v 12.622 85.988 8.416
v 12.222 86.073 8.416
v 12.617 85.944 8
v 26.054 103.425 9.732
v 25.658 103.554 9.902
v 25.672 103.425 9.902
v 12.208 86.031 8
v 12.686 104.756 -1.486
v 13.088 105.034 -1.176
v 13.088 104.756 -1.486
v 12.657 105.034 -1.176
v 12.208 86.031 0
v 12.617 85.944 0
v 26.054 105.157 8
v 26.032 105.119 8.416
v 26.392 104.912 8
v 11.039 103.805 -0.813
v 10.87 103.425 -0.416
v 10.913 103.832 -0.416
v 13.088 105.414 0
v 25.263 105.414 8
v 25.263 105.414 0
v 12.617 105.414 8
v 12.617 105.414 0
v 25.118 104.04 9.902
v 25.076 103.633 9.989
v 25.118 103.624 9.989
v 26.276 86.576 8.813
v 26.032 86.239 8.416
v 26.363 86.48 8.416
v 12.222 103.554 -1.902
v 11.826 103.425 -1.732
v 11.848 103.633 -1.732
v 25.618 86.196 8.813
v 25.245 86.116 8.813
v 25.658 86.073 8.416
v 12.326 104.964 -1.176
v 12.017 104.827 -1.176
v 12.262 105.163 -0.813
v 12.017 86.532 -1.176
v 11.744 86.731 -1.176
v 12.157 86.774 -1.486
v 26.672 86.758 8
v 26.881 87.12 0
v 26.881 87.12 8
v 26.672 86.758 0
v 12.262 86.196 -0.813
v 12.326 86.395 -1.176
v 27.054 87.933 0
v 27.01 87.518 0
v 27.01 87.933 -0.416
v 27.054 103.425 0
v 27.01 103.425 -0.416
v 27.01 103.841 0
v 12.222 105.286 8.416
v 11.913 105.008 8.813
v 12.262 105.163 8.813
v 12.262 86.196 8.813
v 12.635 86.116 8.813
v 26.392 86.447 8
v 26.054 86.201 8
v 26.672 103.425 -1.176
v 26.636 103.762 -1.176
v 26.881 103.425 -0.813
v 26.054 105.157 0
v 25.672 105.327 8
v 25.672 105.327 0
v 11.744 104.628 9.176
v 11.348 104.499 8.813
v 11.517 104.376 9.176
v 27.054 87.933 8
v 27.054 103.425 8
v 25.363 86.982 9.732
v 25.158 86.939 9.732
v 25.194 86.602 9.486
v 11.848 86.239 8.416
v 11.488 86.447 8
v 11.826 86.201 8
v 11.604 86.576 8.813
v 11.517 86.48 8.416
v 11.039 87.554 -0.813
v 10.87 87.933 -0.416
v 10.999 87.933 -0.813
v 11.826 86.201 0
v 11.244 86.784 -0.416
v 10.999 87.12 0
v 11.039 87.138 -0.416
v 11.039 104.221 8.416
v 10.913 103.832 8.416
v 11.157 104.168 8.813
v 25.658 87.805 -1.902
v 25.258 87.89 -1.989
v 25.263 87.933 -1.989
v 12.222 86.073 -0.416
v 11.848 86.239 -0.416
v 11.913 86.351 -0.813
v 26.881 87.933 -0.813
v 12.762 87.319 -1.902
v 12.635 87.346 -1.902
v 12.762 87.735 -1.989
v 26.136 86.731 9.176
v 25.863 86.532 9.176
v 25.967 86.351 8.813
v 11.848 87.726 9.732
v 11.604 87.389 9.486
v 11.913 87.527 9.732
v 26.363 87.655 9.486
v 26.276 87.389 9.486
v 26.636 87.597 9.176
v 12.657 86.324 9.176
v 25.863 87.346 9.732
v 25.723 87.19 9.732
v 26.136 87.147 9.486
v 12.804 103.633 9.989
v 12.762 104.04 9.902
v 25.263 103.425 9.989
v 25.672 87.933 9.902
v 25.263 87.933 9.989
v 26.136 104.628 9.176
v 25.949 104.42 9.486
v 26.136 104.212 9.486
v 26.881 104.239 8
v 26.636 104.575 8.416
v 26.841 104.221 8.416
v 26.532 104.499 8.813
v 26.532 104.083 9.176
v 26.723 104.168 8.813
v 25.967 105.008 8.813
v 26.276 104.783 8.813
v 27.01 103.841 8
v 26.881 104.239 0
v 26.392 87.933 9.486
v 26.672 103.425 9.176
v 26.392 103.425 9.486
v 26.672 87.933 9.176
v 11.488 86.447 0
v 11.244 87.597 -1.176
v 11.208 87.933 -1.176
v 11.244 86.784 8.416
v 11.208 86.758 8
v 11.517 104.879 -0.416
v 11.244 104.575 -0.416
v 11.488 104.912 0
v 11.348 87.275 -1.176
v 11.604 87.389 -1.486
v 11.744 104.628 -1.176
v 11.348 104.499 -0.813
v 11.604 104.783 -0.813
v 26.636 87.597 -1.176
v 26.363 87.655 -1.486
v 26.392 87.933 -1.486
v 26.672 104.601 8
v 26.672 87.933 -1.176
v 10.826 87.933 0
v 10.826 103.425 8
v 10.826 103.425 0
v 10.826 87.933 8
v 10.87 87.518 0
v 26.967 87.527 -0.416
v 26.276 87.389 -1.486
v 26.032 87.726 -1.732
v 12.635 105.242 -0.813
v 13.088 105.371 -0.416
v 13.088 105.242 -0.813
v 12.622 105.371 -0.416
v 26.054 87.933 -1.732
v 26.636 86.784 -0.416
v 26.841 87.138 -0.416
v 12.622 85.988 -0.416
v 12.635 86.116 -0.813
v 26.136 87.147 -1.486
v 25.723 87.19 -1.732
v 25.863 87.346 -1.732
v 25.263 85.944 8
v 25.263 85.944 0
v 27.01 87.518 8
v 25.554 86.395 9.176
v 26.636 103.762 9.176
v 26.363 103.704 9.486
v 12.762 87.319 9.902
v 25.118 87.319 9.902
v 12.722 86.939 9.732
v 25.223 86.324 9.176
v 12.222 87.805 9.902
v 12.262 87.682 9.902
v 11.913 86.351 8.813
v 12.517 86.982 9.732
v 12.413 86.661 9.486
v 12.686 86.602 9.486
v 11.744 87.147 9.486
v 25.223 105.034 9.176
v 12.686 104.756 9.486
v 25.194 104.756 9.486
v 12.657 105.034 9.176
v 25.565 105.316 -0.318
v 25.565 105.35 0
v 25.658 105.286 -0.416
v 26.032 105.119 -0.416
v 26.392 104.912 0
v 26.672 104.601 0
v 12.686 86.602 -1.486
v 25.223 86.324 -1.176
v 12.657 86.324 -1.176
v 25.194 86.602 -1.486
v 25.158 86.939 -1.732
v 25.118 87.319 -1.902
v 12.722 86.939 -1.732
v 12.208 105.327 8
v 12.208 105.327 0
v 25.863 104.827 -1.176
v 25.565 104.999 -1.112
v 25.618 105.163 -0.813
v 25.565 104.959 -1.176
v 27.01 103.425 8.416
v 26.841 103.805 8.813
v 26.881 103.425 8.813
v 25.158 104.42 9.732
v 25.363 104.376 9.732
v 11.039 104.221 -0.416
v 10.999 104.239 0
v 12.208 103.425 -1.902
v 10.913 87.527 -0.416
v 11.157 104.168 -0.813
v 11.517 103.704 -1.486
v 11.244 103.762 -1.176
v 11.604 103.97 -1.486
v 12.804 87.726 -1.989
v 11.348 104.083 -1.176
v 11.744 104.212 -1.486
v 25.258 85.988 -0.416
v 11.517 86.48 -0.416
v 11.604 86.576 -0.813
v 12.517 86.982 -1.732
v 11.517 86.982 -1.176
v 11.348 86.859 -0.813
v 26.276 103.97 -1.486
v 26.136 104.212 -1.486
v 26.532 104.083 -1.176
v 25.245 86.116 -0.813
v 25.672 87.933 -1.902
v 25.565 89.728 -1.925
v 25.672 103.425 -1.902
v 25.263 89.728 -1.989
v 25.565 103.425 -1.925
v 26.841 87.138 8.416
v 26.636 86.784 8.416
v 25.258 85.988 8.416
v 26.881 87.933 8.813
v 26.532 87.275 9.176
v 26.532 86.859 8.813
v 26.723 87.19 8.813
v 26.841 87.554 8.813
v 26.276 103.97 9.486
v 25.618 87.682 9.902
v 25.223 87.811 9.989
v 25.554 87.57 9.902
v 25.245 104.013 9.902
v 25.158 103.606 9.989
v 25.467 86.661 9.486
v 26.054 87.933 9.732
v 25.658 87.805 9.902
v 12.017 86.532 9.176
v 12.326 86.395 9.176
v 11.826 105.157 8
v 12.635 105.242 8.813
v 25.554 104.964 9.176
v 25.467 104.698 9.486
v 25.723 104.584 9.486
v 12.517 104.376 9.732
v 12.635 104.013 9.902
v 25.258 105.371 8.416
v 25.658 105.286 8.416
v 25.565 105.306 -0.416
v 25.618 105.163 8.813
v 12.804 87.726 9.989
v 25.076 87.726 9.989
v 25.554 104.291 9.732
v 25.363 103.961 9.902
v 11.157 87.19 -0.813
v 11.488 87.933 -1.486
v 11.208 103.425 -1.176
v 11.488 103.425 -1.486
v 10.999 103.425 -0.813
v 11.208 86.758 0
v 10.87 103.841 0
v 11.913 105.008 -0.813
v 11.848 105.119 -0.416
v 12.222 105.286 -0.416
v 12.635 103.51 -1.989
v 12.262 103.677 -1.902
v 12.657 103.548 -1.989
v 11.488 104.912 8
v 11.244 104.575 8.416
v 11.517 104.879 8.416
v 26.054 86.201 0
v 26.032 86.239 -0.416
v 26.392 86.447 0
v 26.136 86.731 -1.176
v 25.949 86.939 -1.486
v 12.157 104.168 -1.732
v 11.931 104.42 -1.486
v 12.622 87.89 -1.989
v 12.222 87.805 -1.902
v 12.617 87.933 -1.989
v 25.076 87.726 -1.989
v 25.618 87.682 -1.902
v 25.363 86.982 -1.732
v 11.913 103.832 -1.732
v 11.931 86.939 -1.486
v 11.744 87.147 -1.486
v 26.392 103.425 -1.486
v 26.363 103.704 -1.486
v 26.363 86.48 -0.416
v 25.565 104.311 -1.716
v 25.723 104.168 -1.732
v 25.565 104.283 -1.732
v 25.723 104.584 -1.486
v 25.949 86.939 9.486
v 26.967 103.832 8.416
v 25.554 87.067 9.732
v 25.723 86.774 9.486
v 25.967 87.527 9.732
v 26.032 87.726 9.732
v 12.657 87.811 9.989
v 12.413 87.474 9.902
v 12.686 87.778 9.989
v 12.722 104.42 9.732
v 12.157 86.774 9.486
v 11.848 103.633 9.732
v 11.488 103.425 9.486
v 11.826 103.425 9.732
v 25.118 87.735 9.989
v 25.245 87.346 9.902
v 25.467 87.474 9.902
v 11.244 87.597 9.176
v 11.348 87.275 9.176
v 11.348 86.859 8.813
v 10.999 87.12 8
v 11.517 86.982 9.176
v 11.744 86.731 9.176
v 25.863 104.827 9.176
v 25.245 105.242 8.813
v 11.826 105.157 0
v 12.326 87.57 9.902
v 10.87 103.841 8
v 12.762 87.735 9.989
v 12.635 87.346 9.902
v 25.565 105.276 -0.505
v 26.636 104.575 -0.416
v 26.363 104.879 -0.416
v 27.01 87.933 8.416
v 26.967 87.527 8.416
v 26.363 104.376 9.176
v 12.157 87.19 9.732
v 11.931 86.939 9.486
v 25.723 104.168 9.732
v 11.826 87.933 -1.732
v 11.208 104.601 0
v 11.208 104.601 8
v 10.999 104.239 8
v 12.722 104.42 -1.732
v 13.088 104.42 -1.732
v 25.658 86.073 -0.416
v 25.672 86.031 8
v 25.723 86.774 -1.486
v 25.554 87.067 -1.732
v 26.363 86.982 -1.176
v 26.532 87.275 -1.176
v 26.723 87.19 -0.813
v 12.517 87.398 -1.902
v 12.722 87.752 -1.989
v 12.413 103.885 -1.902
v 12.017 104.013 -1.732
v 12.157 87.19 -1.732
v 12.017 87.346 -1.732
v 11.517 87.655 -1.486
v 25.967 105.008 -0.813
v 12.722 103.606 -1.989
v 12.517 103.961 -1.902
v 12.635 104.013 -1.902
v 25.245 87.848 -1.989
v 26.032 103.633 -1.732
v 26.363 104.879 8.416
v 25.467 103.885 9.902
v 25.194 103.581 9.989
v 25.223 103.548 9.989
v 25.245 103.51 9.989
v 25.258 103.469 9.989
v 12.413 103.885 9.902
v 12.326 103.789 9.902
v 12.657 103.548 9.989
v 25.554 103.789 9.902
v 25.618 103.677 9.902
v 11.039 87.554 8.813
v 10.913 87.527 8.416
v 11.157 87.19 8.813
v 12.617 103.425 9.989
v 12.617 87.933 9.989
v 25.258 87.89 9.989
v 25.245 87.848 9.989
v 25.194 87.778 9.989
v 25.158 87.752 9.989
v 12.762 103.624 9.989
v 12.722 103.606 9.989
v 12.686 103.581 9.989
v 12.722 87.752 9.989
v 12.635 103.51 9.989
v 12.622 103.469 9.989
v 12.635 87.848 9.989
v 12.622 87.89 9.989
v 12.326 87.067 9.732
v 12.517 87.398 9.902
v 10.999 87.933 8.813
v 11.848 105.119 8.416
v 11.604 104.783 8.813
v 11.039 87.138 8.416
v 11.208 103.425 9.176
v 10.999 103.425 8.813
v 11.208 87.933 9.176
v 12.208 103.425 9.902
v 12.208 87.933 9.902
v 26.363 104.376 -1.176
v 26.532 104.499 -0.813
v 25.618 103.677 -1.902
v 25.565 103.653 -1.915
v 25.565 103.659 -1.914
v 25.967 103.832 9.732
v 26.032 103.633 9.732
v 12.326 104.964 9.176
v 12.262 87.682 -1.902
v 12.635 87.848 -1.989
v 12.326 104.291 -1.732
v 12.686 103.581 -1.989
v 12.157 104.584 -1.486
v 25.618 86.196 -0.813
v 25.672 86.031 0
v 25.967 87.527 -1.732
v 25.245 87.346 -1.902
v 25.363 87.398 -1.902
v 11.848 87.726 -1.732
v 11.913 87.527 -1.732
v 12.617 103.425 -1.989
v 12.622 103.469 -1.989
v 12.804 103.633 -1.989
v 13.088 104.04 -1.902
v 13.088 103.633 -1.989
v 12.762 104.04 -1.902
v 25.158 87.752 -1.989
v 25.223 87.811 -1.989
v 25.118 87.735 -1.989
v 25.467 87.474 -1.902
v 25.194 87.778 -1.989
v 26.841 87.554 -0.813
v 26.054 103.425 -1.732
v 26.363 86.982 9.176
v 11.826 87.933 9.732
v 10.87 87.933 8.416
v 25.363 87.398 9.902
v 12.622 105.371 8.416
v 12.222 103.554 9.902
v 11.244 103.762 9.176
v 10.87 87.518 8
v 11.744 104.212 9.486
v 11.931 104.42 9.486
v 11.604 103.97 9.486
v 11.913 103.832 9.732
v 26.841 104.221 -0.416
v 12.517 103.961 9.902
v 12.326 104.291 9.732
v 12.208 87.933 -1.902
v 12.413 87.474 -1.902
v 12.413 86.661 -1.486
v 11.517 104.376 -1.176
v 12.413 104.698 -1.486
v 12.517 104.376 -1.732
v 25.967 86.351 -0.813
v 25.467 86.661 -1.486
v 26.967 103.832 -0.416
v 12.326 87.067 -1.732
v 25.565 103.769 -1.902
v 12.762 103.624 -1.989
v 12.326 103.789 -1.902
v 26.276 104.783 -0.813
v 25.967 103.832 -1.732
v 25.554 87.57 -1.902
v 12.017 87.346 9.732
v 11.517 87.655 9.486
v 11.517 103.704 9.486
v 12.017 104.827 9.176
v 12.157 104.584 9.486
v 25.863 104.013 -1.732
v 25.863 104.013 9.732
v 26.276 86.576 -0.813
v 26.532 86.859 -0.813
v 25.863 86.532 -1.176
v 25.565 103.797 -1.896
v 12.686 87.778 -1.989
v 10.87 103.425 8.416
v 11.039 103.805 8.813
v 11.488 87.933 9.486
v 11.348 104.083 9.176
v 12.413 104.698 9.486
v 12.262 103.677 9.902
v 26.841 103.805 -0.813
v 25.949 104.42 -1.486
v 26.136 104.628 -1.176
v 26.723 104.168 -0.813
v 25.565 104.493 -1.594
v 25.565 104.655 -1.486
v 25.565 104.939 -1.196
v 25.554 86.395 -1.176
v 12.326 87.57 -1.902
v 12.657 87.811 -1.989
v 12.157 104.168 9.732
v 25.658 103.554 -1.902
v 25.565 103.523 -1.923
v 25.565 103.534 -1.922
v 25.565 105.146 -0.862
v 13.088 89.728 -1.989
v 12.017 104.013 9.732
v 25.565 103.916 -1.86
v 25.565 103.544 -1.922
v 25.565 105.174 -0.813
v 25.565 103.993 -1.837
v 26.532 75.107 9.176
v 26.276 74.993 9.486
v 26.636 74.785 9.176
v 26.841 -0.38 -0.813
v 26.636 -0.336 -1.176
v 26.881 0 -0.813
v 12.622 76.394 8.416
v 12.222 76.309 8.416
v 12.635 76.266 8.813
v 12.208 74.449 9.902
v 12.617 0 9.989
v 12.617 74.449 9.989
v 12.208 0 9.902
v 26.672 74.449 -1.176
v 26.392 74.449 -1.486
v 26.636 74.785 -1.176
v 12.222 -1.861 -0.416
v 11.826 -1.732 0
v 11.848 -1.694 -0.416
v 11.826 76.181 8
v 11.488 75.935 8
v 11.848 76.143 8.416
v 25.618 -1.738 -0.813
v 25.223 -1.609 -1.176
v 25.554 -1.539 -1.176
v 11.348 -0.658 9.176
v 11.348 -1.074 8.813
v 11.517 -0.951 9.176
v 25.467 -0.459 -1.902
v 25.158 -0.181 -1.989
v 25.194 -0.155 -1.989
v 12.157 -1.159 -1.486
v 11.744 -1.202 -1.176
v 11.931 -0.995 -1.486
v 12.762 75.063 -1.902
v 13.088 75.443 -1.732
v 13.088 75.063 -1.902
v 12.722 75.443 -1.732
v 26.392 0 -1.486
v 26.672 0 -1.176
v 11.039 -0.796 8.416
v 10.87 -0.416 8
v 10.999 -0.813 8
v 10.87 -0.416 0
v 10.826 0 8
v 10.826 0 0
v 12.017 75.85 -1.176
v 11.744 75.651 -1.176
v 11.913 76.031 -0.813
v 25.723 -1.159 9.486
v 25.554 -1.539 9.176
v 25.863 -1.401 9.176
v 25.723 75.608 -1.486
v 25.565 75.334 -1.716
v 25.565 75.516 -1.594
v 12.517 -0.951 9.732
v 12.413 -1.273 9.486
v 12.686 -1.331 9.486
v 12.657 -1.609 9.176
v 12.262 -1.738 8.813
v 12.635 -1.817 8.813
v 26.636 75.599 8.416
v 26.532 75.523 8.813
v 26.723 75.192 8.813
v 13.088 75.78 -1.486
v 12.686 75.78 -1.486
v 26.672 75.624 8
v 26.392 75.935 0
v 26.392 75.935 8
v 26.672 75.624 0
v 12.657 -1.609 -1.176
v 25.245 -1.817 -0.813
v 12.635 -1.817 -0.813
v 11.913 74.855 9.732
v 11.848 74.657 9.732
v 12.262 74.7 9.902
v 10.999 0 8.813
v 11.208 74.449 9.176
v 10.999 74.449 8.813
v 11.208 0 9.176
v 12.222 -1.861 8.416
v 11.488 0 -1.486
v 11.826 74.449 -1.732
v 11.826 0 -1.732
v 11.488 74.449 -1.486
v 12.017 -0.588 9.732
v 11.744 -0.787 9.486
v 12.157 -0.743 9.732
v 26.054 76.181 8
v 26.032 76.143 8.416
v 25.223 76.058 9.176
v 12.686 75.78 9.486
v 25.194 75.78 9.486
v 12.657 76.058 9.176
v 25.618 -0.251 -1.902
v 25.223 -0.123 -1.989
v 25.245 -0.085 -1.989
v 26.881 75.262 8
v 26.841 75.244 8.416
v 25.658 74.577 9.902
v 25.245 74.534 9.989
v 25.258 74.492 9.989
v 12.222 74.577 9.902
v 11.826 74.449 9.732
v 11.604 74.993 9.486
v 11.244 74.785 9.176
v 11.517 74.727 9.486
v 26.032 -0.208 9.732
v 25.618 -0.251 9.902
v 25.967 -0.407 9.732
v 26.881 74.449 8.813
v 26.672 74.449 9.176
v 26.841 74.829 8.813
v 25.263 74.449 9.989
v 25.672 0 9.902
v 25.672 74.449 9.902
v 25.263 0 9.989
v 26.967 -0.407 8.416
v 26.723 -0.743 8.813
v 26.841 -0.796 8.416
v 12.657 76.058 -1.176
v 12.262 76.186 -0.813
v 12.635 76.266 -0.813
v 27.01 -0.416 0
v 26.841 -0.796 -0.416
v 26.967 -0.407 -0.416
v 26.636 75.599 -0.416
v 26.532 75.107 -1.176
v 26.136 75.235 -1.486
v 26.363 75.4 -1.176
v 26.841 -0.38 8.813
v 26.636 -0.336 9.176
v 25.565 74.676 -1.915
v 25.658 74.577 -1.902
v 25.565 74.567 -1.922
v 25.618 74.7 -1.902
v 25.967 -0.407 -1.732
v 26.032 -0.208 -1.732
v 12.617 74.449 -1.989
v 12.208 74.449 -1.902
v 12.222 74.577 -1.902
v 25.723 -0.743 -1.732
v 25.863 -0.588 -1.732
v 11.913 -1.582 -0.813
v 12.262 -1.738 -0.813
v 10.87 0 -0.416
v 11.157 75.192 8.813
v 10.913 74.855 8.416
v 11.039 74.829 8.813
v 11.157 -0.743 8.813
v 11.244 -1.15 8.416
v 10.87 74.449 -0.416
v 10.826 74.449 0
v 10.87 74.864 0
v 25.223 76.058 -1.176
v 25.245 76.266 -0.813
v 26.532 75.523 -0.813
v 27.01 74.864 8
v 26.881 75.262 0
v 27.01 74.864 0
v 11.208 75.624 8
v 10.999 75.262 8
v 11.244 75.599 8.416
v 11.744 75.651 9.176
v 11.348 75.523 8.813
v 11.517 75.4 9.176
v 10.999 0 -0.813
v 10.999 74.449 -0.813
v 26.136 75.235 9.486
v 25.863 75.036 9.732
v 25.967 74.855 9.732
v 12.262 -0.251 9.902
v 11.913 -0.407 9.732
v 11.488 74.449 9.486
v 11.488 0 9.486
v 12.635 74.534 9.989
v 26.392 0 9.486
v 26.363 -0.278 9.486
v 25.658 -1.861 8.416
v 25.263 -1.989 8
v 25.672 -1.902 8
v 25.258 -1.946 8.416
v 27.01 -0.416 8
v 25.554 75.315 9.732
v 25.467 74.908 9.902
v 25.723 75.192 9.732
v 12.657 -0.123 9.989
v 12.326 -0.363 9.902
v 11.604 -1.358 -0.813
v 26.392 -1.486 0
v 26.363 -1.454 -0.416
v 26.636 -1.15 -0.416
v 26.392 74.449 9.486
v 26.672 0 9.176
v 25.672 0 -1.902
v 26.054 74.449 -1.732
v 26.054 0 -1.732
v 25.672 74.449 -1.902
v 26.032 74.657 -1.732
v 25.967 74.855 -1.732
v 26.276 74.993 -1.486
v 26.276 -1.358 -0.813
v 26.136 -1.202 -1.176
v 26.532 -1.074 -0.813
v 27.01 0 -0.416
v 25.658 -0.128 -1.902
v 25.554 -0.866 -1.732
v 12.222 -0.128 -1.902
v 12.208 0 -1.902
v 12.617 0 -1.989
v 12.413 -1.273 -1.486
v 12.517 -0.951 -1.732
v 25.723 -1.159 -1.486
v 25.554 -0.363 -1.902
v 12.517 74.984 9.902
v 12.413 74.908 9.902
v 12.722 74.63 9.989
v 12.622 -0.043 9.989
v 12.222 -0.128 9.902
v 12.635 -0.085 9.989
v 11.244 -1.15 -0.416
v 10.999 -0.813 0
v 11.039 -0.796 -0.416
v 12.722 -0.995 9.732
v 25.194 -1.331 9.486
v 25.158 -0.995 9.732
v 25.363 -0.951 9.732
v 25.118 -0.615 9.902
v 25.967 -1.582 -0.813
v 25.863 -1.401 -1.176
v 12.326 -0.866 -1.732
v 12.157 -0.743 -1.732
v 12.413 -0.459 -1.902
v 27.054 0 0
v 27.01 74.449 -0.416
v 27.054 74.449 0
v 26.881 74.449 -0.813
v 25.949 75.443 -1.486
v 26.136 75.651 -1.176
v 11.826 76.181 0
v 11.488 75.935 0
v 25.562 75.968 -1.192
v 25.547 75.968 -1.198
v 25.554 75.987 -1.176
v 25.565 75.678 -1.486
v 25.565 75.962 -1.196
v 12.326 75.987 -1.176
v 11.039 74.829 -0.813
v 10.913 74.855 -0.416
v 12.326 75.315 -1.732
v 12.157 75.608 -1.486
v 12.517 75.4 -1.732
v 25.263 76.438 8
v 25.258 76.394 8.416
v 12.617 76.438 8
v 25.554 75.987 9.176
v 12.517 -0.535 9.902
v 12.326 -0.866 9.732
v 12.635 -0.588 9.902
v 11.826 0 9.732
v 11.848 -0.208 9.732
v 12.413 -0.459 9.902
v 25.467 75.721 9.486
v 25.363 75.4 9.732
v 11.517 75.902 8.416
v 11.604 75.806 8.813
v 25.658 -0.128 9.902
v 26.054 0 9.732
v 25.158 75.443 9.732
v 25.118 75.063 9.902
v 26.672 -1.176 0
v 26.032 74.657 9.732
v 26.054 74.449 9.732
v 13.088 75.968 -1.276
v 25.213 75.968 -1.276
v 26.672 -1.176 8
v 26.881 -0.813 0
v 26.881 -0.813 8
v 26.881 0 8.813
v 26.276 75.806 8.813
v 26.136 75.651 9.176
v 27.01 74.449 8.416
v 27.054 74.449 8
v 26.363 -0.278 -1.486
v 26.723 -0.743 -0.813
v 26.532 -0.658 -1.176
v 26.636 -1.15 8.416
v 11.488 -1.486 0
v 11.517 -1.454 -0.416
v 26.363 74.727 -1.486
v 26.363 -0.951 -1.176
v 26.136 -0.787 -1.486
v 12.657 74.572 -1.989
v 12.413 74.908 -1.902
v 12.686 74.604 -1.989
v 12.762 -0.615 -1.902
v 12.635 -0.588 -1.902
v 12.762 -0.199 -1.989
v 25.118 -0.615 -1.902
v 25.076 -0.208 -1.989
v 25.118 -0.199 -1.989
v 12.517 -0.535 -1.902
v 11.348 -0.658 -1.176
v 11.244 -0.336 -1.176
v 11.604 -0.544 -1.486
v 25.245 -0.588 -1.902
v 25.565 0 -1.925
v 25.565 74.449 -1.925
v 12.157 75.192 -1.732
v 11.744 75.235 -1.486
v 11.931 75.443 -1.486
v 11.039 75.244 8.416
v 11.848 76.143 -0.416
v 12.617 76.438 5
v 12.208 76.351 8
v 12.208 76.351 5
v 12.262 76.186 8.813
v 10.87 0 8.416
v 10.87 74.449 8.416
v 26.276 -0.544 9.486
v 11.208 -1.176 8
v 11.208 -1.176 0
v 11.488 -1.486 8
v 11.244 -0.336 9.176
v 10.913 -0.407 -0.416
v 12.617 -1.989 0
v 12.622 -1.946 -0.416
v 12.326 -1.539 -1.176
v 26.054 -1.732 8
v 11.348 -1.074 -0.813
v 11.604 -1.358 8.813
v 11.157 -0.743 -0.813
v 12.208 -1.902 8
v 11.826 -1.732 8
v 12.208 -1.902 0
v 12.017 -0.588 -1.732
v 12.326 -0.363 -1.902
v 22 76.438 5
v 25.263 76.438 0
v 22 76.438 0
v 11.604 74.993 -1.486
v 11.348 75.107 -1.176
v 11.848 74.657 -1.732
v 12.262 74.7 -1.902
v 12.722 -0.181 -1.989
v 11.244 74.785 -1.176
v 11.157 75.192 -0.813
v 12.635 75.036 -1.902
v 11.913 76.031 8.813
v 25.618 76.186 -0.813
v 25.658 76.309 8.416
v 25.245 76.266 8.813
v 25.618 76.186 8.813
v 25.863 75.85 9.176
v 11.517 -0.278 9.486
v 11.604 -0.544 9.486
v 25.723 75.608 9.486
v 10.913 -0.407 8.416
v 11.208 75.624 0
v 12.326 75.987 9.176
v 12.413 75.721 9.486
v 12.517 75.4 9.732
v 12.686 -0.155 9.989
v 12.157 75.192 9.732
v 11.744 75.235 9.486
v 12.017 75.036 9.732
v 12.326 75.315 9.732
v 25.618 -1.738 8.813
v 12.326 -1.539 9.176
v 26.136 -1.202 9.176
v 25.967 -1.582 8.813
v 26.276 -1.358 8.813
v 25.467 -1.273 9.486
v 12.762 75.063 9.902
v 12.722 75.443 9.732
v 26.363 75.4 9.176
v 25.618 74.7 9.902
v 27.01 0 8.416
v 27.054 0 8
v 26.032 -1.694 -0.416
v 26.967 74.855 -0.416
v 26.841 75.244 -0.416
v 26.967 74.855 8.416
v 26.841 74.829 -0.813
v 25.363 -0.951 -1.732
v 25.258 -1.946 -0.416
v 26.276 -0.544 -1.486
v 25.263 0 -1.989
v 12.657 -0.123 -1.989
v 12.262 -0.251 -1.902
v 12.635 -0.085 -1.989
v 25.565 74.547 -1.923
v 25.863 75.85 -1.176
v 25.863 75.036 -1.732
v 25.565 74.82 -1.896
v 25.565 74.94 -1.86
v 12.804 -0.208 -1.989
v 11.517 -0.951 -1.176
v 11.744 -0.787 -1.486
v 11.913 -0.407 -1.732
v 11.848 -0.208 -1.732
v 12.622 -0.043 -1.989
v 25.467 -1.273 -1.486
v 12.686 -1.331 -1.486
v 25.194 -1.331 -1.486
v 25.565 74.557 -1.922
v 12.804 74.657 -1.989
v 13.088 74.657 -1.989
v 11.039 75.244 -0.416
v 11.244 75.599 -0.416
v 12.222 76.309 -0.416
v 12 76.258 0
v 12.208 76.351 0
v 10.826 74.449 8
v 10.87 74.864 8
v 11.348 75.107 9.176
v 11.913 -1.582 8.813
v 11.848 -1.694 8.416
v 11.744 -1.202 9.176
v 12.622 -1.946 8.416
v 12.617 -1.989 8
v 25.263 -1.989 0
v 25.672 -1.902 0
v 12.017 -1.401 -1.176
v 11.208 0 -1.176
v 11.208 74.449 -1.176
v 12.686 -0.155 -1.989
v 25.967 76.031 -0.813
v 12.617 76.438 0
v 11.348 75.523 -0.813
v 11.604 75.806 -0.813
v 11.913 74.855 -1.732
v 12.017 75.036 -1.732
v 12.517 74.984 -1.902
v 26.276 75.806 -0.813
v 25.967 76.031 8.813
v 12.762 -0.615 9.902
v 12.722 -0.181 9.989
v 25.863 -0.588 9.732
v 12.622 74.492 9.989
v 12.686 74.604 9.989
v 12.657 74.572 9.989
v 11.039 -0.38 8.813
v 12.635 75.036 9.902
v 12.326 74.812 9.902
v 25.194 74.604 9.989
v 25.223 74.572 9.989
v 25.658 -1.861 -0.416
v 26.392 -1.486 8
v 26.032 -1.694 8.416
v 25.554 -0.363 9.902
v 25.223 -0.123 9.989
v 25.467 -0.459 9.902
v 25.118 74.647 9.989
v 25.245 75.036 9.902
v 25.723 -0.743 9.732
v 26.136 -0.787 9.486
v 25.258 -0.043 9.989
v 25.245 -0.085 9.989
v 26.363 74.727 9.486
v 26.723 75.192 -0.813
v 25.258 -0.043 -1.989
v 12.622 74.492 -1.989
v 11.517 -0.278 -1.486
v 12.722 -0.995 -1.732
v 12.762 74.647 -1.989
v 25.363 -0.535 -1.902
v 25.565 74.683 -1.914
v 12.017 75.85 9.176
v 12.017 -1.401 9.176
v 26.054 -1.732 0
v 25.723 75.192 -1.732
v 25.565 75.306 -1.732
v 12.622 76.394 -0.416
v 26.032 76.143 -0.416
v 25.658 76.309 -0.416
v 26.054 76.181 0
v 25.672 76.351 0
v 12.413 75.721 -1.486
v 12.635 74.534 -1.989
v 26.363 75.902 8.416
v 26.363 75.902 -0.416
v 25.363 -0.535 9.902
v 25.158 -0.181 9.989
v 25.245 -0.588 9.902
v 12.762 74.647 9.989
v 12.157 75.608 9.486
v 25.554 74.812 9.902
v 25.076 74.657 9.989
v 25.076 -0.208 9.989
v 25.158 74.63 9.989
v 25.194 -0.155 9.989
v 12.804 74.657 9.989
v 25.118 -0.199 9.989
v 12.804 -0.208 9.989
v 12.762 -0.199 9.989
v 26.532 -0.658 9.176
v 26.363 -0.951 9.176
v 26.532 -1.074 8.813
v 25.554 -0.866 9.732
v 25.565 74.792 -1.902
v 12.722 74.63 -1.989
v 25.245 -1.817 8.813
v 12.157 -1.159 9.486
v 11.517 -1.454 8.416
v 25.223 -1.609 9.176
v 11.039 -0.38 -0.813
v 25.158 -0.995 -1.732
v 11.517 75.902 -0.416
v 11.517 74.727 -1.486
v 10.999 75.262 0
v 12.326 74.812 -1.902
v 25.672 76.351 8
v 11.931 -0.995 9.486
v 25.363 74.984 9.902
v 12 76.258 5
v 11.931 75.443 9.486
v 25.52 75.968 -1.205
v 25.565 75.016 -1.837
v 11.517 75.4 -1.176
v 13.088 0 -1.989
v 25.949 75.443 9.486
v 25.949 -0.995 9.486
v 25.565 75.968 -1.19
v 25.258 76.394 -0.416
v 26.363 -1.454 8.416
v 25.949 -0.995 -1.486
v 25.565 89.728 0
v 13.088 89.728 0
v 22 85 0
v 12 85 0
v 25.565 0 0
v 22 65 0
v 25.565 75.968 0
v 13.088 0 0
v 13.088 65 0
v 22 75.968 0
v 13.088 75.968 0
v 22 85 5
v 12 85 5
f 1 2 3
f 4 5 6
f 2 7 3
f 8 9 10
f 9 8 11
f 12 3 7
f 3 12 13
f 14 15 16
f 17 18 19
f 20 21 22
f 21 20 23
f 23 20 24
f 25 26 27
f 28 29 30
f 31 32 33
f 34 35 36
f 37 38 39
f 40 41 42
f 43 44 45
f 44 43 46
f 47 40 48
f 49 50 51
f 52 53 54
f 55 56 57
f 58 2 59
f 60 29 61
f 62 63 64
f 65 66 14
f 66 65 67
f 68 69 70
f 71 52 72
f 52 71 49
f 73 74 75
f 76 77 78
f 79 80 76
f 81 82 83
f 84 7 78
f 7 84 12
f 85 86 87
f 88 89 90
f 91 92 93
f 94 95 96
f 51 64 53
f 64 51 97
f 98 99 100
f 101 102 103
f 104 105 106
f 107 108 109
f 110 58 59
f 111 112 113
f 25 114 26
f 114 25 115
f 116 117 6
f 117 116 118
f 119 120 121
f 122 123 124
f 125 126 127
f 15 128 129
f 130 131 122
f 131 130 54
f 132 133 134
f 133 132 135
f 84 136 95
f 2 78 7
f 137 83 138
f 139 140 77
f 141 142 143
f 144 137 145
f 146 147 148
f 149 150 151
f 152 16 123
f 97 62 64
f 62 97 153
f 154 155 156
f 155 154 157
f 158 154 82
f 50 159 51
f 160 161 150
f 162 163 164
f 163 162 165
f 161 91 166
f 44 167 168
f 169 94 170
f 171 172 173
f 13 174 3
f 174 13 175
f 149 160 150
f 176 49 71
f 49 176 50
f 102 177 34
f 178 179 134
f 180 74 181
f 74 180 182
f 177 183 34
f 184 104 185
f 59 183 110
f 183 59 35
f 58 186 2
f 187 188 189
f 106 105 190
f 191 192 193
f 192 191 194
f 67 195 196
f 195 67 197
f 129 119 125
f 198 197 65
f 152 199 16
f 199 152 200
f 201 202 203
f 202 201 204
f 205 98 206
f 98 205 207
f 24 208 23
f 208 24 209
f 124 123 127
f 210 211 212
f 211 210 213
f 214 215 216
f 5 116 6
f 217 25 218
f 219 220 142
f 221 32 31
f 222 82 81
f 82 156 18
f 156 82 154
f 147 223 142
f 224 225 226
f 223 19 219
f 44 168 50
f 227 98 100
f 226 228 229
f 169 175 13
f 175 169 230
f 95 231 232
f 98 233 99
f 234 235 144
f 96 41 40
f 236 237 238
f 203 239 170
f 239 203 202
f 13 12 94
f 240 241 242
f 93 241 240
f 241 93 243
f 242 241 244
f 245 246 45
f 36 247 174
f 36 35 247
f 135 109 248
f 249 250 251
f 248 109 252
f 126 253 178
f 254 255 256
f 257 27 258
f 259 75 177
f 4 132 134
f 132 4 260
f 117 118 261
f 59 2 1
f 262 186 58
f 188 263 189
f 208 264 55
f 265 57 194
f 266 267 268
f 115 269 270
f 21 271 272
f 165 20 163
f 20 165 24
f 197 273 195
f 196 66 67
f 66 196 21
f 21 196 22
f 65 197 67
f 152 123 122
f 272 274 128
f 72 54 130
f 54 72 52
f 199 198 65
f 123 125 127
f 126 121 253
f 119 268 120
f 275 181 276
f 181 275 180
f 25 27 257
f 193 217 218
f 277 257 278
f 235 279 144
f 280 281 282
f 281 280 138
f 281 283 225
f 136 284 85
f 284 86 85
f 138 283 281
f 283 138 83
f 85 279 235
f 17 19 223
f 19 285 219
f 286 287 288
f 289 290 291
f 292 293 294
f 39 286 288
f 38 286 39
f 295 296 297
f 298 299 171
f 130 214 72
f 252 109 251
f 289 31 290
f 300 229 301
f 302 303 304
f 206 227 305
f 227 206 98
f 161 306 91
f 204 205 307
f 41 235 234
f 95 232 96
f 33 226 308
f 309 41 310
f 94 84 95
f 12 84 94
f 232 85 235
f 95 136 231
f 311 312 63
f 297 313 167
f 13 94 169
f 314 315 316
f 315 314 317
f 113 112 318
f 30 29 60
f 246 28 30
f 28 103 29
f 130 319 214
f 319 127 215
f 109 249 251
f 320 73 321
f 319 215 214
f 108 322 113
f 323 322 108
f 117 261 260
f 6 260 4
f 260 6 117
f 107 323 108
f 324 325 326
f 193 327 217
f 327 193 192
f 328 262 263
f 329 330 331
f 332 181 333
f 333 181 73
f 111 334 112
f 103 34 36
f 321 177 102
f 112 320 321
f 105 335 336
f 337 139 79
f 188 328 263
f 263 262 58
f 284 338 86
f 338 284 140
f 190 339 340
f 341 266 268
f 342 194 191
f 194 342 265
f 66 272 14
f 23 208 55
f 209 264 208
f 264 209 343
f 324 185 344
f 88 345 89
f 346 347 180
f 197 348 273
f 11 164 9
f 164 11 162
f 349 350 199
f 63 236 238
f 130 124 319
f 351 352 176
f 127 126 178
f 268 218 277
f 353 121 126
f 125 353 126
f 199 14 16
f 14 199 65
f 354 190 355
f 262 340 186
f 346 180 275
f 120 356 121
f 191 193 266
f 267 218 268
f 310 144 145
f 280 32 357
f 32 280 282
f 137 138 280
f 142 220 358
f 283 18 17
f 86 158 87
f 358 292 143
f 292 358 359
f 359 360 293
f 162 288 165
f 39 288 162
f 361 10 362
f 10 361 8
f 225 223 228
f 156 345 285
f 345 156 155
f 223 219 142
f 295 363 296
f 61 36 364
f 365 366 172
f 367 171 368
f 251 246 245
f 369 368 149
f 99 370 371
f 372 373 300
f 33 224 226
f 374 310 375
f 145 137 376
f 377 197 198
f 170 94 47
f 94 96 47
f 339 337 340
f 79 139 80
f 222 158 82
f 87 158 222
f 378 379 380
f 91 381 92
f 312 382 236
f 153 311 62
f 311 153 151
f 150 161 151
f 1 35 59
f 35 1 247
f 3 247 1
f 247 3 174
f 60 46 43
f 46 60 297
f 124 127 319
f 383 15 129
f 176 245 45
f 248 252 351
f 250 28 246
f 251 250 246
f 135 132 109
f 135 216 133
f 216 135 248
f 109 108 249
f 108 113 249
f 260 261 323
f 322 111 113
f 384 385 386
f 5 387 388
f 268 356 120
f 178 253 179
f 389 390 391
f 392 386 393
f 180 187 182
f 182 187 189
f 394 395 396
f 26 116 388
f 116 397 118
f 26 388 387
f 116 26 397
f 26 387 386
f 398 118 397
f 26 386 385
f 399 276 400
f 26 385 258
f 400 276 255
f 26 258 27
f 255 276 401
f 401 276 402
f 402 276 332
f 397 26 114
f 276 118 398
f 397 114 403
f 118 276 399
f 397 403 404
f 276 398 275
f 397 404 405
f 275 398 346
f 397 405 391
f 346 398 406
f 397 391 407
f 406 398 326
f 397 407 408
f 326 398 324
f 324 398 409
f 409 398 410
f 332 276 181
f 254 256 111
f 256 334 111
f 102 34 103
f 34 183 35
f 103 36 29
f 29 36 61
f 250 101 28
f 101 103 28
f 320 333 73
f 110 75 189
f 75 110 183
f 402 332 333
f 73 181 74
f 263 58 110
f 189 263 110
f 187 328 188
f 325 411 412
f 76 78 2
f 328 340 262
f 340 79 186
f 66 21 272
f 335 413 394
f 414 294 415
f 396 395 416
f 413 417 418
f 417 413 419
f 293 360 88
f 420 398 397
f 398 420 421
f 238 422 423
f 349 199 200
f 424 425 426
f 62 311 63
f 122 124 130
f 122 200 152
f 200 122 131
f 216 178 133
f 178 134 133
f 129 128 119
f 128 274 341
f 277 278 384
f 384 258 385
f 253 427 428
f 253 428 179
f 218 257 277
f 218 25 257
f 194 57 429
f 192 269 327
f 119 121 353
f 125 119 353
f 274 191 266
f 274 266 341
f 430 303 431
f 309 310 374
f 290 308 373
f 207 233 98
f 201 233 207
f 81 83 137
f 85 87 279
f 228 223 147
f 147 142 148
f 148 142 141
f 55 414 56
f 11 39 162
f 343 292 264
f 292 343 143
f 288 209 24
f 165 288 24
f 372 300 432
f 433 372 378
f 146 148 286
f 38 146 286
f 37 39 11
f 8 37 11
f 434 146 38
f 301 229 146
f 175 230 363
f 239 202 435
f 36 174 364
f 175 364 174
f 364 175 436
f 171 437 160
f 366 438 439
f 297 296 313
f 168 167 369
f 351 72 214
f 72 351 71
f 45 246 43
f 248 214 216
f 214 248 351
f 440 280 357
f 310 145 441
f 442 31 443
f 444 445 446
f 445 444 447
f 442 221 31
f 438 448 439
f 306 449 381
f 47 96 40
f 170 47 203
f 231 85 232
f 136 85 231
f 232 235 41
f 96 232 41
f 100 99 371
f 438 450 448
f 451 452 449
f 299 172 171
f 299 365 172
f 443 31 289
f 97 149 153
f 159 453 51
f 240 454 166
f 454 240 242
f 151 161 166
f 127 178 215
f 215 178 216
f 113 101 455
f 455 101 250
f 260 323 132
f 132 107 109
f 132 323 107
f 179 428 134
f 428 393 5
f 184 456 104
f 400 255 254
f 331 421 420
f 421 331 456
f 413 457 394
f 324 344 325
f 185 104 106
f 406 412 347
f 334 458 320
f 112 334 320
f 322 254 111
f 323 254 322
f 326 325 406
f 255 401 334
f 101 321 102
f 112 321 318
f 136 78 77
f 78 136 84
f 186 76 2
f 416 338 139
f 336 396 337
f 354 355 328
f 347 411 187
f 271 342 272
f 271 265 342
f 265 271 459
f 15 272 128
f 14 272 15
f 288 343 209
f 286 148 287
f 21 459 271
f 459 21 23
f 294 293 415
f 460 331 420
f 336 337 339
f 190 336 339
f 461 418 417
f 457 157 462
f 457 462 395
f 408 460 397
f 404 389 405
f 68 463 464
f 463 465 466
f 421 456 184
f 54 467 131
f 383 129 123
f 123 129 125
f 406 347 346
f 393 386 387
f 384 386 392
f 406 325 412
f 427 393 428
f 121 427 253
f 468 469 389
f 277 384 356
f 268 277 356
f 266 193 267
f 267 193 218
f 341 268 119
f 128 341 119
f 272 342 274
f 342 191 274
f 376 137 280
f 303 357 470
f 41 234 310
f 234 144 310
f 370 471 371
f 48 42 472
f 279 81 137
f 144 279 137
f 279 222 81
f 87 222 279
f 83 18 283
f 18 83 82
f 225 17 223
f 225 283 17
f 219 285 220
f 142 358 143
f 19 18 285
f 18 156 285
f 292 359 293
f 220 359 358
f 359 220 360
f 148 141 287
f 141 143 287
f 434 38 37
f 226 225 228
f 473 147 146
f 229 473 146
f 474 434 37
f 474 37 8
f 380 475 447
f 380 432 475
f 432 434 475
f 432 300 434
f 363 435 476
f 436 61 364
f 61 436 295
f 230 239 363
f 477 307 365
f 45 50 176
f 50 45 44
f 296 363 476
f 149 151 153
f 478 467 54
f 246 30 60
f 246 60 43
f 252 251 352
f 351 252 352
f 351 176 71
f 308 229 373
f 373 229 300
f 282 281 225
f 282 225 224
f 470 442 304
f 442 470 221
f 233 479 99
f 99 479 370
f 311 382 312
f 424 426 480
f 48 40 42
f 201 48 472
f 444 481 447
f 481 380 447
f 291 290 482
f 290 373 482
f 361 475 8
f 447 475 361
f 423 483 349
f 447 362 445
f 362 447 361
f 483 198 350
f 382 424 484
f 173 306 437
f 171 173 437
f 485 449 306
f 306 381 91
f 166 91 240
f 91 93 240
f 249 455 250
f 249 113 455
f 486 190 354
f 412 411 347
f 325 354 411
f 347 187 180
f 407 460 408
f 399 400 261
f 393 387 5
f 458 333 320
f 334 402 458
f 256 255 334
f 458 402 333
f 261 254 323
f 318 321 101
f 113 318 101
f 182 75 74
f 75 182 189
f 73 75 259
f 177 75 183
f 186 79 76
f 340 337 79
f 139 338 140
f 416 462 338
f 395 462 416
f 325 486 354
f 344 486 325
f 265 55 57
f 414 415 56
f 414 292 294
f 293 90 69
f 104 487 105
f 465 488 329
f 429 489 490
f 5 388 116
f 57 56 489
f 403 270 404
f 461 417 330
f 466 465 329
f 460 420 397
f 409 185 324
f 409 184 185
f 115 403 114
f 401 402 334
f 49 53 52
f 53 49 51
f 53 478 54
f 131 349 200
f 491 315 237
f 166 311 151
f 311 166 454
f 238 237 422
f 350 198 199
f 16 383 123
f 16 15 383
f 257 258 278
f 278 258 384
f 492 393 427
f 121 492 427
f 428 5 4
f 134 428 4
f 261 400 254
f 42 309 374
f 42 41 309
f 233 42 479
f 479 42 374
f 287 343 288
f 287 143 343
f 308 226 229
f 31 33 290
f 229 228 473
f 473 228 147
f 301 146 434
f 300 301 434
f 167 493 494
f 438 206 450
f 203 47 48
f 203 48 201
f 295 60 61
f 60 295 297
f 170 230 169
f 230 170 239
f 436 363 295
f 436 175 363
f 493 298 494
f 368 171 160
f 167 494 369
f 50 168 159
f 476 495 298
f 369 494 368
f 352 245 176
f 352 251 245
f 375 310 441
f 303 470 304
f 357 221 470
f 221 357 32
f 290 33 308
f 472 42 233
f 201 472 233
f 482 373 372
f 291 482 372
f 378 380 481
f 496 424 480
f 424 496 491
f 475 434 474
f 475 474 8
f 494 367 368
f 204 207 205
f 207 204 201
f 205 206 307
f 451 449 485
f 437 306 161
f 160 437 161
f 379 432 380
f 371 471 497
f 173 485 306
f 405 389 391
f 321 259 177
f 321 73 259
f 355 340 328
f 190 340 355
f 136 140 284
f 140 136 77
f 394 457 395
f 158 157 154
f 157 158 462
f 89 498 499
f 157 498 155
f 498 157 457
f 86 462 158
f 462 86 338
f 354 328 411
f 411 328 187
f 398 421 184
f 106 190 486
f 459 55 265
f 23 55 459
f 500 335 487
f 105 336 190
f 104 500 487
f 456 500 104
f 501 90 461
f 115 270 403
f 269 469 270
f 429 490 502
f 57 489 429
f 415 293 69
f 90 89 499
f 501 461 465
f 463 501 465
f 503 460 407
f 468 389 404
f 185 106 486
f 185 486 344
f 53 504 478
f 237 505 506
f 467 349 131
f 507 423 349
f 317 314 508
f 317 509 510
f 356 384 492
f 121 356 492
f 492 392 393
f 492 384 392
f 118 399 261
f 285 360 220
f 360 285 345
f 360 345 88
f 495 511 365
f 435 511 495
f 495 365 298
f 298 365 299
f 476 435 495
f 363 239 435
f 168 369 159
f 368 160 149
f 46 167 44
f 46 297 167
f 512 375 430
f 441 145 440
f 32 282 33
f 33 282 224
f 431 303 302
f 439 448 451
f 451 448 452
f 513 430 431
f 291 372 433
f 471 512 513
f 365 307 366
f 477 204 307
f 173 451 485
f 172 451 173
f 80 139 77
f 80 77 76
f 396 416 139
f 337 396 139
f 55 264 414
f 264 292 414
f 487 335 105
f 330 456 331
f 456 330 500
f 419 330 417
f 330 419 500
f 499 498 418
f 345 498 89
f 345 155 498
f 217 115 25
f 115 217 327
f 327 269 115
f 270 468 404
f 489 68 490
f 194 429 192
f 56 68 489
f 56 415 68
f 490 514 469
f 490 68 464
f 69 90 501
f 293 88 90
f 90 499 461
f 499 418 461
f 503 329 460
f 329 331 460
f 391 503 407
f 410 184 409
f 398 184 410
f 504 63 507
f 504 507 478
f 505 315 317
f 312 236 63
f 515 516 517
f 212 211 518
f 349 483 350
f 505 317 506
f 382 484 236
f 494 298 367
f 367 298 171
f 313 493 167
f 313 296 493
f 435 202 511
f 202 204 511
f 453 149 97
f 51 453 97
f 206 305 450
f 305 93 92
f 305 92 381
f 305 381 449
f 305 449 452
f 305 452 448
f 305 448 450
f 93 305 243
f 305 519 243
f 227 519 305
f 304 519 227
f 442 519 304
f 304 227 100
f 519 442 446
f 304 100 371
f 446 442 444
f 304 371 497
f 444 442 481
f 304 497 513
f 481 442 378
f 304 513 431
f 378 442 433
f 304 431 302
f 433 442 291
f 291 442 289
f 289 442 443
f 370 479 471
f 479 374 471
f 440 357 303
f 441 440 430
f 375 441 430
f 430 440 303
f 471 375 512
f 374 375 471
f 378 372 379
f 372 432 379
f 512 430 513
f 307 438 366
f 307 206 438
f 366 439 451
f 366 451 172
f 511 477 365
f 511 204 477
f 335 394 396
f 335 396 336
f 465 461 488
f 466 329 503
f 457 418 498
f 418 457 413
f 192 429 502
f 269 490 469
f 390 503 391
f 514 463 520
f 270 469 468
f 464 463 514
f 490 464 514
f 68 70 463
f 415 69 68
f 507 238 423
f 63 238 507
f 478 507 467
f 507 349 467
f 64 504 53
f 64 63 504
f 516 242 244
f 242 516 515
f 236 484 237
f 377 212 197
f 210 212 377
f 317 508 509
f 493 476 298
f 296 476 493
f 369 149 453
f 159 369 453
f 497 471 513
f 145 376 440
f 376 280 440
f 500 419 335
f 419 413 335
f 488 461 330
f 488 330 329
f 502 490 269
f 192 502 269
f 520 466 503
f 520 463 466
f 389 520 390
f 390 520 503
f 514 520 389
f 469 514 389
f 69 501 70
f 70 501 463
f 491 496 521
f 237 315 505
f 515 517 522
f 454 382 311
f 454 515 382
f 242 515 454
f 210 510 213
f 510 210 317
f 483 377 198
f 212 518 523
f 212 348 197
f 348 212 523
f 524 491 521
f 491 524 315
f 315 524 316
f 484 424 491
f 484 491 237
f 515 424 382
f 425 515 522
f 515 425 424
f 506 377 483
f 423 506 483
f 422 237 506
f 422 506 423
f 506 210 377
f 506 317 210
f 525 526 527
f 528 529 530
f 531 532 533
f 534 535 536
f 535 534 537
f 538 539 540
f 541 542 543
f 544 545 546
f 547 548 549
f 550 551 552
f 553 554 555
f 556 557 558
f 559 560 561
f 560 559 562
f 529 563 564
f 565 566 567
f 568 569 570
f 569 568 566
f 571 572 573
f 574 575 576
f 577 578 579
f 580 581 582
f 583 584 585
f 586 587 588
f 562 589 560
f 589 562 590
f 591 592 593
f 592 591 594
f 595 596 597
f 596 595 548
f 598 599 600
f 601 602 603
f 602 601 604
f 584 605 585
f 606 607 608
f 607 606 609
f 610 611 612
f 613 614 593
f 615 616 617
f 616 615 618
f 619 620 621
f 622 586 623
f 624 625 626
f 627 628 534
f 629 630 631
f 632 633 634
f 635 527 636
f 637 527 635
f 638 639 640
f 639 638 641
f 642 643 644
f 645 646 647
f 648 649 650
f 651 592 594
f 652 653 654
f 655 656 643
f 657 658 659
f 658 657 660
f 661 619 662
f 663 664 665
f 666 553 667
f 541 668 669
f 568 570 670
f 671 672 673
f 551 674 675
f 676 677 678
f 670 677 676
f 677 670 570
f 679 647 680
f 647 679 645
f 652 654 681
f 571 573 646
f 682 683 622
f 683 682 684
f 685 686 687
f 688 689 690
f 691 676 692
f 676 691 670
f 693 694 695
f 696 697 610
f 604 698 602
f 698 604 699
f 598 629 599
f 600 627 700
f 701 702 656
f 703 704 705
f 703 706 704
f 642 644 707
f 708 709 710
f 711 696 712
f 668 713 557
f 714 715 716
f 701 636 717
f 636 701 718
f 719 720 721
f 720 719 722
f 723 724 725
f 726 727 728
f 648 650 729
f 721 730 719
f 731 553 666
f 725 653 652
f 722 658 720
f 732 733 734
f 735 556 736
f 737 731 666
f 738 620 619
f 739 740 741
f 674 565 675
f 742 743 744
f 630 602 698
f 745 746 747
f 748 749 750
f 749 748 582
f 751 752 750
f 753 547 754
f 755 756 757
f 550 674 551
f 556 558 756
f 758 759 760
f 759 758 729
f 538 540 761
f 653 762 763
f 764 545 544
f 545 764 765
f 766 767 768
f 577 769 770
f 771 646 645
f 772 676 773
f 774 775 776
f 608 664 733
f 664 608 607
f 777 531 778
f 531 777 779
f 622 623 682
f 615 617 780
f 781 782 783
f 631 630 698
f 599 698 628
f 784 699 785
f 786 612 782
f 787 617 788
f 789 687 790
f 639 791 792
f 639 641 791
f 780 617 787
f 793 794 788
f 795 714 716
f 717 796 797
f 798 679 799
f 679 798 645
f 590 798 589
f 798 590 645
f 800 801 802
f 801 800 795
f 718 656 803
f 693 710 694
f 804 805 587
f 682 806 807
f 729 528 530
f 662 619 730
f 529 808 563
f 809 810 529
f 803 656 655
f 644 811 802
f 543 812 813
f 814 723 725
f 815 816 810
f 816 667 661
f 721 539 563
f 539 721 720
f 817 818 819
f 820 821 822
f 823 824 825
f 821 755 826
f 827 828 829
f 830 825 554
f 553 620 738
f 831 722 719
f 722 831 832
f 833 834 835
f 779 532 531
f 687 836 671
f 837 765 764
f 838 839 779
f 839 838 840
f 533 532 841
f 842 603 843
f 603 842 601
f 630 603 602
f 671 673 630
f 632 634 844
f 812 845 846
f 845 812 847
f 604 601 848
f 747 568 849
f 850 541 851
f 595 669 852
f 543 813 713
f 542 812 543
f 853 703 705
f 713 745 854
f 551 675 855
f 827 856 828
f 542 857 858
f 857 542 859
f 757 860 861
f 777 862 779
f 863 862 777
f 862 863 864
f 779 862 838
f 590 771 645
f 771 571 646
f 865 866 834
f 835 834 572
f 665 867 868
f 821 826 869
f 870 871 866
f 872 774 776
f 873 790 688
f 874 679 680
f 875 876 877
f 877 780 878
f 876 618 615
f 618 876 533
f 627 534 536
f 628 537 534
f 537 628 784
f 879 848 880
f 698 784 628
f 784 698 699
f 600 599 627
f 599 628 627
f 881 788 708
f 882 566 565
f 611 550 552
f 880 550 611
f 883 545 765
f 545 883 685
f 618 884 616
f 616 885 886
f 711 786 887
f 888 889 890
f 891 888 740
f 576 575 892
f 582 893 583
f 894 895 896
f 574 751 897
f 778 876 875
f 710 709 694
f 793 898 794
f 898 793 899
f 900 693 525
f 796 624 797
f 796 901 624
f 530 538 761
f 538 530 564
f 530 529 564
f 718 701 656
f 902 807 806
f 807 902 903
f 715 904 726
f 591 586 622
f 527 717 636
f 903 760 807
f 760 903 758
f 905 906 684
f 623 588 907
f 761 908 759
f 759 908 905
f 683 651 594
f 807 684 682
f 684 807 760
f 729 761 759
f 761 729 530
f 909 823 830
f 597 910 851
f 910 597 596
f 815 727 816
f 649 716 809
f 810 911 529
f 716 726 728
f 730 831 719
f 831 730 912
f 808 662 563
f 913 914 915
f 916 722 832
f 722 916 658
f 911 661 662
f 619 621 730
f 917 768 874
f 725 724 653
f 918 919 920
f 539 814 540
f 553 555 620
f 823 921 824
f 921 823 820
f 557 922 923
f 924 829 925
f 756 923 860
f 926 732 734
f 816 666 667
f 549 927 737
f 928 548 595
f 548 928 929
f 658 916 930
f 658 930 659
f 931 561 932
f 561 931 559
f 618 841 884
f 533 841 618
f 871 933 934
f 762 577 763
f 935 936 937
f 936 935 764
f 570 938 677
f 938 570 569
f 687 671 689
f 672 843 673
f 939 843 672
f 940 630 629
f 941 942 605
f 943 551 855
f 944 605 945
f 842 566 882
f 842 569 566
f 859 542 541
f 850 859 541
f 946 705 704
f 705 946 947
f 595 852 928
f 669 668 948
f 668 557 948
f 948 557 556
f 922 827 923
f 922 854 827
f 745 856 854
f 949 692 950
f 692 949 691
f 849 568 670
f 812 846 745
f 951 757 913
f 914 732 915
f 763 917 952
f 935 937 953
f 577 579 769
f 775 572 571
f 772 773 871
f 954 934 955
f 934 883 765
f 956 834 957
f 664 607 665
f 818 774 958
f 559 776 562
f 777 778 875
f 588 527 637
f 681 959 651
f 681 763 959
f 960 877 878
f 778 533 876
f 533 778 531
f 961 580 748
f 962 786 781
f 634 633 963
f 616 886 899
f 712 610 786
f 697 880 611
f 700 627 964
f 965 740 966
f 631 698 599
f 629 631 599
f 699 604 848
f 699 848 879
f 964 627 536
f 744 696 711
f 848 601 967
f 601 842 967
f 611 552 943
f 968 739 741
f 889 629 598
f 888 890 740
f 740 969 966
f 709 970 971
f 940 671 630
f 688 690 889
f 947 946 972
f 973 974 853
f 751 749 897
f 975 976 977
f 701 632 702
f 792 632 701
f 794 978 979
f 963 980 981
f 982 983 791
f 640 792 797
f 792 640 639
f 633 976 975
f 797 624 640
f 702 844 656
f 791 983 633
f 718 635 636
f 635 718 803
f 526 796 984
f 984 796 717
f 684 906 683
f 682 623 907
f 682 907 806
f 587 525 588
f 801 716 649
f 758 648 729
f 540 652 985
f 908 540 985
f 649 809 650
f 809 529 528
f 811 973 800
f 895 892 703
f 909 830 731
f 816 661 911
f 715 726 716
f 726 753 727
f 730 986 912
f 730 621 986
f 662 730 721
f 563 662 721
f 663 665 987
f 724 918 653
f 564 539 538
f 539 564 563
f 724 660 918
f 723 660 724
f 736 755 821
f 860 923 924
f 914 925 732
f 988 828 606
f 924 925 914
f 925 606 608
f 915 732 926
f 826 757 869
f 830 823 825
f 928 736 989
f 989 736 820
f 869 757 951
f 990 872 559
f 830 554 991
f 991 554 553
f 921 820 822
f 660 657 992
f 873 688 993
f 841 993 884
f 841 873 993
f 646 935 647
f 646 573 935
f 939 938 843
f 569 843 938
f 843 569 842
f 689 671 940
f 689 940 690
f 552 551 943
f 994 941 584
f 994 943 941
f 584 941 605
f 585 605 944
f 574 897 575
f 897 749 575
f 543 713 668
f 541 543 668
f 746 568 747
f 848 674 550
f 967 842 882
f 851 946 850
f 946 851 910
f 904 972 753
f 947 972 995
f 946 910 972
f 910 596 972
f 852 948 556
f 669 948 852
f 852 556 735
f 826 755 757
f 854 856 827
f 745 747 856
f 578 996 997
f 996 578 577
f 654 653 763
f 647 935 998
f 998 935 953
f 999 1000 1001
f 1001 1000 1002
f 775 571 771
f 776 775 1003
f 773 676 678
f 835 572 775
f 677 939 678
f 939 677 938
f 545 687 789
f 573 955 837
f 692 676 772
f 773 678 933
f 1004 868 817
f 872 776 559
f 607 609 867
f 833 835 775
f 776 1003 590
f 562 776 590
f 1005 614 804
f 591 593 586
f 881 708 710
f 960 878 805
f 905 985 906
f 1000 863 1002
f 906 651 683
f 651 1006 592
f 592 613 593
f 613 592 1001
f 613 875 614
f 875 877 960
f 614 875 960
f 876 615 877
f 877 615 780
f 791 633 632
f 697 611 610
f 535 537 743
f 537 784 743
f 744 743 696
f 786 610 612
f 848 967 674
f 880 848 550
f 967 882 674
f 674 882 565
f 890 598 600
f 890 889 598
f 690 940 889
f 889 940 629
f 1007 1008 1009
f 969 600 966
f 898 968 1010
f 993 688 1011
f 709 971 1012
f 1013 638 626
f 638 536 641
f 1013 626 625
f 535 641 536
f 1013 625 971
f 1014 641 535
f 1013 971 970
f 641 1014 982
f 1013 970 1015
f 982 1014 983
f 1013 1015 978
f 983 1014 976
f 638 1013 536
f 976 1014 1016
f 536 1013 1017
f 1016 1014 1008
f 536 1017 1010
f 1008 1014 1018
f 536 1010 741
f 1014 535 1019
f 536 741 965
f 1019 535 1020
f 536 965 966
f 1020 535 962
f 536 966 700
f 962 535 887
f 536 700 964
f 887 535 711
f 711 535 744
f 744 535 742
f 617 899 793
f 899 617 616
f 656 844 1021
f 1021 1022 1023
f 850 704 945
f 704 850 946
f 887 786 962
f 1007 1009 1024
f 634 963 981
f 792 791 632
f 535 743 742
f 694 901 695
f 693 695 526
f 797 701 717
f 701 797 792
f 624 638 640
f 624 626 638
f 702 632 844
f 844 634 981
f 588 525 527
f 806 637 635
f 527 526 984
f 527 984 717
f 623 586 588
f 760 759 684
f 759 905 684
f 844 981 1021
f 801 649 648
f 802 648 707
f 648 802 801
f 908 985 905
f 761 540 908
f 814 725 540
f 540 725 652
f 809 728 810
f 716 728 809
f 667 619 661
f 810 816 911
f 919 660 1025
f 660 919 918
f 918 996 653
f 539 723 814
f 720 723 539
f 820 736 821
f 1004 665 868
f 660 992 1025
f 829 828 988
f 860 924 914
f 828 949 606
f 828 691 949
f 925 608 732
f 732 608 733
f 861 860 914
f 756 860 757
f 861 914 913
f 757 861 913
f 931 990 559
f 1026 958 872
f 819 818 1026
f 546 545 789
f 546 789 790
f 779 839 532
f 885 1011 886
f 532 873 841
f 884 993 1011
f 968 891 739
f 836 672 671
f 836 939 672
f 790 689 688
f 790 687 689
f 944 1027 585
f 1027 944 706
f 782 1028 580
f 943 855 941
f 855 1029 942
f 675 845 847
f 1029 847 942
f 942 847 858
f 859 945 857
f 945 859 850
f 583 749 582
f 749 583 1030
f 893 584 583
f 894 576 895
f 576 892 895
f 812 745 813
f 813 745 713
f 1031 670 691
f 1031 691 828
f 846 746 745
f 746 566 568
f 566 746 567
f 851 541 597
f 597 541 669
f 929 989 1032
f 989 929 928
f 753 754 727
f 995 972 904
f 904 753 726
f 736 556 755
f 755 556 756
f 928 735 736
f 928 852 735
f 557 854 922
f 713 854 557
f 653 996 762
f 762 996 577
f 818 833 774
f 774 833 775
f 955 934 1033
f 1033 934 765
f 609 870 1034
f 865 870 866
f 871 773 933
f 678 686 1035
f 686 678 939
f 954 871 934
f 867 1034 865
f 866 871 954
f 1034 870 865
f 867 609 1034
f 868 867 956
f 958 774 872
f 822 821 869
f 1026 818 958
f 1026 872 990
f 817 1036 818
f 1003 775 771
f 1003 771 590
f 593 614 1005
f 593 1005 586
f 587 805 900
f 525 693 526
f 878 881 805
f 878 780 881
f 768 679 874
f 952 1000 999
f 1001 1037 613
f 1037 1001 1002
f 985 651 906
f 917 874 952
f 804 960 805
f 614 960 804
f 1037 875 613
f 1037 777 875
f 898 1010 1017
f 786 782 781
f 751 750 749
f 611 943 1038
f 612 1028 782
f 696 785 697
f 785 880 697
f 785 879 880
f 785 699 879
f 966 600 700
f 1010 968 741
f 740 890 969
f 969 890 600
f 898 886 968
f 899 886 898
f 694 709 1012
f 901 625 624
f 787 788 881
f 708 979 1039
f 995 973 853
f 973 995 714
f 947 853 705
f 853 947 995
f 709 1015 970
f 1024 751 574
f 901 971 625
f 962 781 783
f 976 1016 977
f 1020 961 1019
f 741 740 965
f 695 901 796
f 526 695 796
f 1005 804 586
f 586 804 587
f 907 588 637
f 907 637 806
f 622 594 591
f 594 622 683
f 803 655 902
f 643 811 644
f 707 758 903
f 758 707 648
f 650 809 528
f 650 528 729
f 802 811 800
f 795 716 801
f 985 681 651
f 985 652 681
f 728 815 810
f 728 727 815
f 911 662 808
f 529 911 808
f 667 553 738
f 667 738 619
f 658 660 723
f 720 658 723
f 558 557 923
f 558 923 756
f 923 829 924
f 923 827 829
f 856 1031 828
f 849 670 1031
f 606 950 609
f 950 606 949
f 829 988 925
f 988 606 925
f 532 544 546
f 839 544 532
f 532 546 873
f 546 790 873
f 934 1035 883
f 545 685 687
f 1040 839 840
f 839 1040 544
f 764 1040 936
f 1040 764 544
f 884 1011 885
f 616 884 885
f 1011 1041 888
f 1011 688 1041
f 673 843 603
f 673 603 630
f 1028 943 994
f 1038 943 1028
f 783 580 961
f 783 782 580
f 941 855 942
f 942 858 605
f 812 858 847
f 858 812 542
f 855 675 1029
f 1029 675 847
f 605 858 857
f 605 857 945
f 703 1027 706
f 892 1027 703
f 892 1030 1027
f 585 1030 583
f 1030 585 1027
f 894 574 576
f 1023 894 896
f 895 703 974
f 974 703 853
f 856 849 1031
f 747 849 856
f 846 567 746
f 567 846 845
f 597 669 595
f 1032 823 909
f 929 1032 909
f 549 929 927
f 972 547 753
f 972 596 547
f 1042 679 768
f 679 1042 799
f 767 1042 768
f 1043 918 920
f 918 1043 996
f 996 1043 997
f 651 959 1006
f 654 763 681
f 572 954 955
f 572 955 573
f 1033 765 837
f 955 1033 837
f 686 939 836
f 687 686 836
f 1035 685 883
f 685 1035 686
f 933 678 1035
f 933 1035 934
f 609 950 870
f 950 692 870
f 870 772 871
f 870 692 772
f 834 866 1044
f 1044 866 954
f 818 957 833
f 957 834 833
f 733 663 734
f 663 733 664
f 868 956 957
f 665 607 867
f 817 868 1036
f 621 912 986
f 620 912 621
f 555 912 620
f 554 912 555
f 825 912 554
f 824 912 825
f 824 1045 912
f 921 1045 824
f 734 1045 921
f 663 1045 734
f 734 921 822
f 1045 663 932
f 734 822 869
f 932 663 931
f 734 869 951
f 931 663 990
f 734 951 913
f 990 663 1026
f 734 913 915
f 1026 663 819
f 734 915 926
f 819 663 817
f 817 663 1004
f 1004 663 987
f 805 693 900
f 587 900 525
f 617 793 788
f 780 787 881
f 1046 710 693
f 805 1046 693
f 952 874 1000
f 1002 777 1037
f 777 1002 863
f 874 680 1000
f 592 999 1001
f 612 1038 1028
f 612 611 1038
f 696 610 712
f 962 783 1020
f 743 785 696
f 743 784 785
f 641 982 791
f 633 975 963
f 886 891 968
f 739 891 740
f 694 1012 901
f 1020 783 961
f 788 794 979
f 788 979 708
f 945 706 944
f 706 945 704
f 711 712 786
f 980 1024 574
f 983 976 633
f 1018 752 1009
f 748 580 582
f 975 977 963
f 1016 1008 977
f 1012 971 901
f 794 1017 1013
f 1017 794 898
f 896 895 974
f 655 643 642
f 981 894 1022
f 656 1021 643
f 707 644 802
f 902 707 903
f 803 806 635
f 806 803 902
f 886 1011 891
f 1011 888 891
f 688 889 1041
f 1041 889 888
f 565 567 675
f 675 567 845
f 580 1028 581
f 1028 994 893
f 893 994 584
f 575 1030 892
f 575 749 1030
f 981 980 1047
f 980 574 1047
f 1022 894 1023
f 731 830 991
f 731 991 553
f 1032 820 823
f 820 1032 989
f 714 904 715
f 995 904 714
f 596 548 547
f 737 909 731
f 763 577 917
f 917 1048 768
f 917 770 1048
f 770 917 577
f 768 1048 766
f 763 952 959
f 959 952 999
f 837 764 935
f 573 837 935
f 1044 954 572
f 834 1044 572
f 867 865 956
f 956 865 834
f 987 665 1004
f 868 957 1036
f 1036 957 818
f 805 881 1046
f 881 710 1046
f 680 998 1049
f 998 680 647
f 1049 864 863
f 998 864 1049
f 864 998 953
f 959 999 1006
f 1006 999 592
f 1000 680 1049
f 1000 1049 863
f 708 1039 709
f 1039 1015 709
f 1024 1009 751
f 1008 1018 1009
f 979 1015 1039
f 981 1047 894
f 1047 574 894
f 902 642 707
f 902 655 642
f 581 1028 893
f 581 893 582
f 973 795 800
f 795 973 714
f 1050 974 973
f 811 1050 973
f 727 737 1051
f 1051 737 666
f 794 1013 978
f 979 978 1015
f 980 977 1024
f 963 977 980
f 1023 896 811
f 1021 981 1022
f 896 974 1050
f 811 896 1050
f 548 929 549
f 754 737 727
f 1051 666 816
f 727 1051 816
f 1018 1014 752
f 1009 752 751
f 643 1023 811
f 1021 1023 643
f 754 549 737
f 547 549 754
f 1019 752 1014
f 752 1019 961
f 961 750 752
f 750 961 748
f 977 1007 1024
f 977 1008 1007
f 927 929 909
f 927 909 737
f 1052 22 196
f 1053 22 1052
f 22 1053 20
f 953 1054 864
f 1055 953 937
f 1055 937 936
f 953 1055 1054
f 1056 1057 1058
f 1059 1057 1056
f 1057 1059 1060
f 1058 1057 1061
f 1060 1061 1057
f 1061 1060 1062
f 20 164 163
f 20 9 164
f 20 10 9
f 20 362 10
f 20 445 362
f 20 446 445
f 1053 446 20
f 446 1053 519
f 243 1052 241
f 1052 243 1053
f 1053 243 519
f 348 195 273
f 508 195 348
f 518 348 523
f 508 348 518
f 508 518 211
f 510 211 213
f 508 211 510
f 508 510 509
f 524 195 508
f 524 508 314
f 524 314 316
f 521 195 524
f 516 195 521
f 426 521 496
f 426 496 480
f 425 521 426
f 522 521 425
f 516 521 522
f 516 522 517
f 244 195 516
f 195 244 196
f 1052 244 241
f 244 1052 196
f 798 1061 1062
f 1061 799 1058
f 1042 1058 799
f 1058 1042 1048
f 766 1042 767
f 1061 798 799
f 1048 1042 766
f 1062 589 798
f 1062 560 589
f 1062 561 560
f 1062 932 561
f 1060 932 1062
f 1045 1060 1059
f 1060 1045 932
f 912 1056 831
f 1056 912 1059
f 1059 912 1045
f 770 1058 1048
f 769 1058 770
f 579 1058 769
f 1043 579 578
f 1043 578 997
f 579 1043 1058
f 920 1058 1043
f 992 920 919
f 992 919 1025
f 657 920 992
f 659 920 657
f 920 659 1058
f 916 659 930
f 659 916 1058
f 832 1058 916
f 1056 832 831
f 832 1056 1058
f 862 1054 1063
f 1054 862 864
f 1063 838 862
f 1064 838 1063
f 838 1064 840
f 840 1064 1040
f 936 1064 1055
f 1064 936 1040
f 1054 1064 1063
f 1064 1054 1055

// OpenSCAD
$fn=30;
size=100;
round=2;
height=10;
font="Fredoka One:style=Regular";

letter="i";

difference() {
  minkowski() {
    sphere(round);
    linear_extrude(height-round) text(letter, size=size-round, font=font);
  }
  translate([0,0,-round]) linear_extrude(round) text(letter,size=size,font=font);
}
if (letter == "j" || letter == "i") {
  echo("block");
  translate([12,65,0]) cube([10,20,5]);
}
